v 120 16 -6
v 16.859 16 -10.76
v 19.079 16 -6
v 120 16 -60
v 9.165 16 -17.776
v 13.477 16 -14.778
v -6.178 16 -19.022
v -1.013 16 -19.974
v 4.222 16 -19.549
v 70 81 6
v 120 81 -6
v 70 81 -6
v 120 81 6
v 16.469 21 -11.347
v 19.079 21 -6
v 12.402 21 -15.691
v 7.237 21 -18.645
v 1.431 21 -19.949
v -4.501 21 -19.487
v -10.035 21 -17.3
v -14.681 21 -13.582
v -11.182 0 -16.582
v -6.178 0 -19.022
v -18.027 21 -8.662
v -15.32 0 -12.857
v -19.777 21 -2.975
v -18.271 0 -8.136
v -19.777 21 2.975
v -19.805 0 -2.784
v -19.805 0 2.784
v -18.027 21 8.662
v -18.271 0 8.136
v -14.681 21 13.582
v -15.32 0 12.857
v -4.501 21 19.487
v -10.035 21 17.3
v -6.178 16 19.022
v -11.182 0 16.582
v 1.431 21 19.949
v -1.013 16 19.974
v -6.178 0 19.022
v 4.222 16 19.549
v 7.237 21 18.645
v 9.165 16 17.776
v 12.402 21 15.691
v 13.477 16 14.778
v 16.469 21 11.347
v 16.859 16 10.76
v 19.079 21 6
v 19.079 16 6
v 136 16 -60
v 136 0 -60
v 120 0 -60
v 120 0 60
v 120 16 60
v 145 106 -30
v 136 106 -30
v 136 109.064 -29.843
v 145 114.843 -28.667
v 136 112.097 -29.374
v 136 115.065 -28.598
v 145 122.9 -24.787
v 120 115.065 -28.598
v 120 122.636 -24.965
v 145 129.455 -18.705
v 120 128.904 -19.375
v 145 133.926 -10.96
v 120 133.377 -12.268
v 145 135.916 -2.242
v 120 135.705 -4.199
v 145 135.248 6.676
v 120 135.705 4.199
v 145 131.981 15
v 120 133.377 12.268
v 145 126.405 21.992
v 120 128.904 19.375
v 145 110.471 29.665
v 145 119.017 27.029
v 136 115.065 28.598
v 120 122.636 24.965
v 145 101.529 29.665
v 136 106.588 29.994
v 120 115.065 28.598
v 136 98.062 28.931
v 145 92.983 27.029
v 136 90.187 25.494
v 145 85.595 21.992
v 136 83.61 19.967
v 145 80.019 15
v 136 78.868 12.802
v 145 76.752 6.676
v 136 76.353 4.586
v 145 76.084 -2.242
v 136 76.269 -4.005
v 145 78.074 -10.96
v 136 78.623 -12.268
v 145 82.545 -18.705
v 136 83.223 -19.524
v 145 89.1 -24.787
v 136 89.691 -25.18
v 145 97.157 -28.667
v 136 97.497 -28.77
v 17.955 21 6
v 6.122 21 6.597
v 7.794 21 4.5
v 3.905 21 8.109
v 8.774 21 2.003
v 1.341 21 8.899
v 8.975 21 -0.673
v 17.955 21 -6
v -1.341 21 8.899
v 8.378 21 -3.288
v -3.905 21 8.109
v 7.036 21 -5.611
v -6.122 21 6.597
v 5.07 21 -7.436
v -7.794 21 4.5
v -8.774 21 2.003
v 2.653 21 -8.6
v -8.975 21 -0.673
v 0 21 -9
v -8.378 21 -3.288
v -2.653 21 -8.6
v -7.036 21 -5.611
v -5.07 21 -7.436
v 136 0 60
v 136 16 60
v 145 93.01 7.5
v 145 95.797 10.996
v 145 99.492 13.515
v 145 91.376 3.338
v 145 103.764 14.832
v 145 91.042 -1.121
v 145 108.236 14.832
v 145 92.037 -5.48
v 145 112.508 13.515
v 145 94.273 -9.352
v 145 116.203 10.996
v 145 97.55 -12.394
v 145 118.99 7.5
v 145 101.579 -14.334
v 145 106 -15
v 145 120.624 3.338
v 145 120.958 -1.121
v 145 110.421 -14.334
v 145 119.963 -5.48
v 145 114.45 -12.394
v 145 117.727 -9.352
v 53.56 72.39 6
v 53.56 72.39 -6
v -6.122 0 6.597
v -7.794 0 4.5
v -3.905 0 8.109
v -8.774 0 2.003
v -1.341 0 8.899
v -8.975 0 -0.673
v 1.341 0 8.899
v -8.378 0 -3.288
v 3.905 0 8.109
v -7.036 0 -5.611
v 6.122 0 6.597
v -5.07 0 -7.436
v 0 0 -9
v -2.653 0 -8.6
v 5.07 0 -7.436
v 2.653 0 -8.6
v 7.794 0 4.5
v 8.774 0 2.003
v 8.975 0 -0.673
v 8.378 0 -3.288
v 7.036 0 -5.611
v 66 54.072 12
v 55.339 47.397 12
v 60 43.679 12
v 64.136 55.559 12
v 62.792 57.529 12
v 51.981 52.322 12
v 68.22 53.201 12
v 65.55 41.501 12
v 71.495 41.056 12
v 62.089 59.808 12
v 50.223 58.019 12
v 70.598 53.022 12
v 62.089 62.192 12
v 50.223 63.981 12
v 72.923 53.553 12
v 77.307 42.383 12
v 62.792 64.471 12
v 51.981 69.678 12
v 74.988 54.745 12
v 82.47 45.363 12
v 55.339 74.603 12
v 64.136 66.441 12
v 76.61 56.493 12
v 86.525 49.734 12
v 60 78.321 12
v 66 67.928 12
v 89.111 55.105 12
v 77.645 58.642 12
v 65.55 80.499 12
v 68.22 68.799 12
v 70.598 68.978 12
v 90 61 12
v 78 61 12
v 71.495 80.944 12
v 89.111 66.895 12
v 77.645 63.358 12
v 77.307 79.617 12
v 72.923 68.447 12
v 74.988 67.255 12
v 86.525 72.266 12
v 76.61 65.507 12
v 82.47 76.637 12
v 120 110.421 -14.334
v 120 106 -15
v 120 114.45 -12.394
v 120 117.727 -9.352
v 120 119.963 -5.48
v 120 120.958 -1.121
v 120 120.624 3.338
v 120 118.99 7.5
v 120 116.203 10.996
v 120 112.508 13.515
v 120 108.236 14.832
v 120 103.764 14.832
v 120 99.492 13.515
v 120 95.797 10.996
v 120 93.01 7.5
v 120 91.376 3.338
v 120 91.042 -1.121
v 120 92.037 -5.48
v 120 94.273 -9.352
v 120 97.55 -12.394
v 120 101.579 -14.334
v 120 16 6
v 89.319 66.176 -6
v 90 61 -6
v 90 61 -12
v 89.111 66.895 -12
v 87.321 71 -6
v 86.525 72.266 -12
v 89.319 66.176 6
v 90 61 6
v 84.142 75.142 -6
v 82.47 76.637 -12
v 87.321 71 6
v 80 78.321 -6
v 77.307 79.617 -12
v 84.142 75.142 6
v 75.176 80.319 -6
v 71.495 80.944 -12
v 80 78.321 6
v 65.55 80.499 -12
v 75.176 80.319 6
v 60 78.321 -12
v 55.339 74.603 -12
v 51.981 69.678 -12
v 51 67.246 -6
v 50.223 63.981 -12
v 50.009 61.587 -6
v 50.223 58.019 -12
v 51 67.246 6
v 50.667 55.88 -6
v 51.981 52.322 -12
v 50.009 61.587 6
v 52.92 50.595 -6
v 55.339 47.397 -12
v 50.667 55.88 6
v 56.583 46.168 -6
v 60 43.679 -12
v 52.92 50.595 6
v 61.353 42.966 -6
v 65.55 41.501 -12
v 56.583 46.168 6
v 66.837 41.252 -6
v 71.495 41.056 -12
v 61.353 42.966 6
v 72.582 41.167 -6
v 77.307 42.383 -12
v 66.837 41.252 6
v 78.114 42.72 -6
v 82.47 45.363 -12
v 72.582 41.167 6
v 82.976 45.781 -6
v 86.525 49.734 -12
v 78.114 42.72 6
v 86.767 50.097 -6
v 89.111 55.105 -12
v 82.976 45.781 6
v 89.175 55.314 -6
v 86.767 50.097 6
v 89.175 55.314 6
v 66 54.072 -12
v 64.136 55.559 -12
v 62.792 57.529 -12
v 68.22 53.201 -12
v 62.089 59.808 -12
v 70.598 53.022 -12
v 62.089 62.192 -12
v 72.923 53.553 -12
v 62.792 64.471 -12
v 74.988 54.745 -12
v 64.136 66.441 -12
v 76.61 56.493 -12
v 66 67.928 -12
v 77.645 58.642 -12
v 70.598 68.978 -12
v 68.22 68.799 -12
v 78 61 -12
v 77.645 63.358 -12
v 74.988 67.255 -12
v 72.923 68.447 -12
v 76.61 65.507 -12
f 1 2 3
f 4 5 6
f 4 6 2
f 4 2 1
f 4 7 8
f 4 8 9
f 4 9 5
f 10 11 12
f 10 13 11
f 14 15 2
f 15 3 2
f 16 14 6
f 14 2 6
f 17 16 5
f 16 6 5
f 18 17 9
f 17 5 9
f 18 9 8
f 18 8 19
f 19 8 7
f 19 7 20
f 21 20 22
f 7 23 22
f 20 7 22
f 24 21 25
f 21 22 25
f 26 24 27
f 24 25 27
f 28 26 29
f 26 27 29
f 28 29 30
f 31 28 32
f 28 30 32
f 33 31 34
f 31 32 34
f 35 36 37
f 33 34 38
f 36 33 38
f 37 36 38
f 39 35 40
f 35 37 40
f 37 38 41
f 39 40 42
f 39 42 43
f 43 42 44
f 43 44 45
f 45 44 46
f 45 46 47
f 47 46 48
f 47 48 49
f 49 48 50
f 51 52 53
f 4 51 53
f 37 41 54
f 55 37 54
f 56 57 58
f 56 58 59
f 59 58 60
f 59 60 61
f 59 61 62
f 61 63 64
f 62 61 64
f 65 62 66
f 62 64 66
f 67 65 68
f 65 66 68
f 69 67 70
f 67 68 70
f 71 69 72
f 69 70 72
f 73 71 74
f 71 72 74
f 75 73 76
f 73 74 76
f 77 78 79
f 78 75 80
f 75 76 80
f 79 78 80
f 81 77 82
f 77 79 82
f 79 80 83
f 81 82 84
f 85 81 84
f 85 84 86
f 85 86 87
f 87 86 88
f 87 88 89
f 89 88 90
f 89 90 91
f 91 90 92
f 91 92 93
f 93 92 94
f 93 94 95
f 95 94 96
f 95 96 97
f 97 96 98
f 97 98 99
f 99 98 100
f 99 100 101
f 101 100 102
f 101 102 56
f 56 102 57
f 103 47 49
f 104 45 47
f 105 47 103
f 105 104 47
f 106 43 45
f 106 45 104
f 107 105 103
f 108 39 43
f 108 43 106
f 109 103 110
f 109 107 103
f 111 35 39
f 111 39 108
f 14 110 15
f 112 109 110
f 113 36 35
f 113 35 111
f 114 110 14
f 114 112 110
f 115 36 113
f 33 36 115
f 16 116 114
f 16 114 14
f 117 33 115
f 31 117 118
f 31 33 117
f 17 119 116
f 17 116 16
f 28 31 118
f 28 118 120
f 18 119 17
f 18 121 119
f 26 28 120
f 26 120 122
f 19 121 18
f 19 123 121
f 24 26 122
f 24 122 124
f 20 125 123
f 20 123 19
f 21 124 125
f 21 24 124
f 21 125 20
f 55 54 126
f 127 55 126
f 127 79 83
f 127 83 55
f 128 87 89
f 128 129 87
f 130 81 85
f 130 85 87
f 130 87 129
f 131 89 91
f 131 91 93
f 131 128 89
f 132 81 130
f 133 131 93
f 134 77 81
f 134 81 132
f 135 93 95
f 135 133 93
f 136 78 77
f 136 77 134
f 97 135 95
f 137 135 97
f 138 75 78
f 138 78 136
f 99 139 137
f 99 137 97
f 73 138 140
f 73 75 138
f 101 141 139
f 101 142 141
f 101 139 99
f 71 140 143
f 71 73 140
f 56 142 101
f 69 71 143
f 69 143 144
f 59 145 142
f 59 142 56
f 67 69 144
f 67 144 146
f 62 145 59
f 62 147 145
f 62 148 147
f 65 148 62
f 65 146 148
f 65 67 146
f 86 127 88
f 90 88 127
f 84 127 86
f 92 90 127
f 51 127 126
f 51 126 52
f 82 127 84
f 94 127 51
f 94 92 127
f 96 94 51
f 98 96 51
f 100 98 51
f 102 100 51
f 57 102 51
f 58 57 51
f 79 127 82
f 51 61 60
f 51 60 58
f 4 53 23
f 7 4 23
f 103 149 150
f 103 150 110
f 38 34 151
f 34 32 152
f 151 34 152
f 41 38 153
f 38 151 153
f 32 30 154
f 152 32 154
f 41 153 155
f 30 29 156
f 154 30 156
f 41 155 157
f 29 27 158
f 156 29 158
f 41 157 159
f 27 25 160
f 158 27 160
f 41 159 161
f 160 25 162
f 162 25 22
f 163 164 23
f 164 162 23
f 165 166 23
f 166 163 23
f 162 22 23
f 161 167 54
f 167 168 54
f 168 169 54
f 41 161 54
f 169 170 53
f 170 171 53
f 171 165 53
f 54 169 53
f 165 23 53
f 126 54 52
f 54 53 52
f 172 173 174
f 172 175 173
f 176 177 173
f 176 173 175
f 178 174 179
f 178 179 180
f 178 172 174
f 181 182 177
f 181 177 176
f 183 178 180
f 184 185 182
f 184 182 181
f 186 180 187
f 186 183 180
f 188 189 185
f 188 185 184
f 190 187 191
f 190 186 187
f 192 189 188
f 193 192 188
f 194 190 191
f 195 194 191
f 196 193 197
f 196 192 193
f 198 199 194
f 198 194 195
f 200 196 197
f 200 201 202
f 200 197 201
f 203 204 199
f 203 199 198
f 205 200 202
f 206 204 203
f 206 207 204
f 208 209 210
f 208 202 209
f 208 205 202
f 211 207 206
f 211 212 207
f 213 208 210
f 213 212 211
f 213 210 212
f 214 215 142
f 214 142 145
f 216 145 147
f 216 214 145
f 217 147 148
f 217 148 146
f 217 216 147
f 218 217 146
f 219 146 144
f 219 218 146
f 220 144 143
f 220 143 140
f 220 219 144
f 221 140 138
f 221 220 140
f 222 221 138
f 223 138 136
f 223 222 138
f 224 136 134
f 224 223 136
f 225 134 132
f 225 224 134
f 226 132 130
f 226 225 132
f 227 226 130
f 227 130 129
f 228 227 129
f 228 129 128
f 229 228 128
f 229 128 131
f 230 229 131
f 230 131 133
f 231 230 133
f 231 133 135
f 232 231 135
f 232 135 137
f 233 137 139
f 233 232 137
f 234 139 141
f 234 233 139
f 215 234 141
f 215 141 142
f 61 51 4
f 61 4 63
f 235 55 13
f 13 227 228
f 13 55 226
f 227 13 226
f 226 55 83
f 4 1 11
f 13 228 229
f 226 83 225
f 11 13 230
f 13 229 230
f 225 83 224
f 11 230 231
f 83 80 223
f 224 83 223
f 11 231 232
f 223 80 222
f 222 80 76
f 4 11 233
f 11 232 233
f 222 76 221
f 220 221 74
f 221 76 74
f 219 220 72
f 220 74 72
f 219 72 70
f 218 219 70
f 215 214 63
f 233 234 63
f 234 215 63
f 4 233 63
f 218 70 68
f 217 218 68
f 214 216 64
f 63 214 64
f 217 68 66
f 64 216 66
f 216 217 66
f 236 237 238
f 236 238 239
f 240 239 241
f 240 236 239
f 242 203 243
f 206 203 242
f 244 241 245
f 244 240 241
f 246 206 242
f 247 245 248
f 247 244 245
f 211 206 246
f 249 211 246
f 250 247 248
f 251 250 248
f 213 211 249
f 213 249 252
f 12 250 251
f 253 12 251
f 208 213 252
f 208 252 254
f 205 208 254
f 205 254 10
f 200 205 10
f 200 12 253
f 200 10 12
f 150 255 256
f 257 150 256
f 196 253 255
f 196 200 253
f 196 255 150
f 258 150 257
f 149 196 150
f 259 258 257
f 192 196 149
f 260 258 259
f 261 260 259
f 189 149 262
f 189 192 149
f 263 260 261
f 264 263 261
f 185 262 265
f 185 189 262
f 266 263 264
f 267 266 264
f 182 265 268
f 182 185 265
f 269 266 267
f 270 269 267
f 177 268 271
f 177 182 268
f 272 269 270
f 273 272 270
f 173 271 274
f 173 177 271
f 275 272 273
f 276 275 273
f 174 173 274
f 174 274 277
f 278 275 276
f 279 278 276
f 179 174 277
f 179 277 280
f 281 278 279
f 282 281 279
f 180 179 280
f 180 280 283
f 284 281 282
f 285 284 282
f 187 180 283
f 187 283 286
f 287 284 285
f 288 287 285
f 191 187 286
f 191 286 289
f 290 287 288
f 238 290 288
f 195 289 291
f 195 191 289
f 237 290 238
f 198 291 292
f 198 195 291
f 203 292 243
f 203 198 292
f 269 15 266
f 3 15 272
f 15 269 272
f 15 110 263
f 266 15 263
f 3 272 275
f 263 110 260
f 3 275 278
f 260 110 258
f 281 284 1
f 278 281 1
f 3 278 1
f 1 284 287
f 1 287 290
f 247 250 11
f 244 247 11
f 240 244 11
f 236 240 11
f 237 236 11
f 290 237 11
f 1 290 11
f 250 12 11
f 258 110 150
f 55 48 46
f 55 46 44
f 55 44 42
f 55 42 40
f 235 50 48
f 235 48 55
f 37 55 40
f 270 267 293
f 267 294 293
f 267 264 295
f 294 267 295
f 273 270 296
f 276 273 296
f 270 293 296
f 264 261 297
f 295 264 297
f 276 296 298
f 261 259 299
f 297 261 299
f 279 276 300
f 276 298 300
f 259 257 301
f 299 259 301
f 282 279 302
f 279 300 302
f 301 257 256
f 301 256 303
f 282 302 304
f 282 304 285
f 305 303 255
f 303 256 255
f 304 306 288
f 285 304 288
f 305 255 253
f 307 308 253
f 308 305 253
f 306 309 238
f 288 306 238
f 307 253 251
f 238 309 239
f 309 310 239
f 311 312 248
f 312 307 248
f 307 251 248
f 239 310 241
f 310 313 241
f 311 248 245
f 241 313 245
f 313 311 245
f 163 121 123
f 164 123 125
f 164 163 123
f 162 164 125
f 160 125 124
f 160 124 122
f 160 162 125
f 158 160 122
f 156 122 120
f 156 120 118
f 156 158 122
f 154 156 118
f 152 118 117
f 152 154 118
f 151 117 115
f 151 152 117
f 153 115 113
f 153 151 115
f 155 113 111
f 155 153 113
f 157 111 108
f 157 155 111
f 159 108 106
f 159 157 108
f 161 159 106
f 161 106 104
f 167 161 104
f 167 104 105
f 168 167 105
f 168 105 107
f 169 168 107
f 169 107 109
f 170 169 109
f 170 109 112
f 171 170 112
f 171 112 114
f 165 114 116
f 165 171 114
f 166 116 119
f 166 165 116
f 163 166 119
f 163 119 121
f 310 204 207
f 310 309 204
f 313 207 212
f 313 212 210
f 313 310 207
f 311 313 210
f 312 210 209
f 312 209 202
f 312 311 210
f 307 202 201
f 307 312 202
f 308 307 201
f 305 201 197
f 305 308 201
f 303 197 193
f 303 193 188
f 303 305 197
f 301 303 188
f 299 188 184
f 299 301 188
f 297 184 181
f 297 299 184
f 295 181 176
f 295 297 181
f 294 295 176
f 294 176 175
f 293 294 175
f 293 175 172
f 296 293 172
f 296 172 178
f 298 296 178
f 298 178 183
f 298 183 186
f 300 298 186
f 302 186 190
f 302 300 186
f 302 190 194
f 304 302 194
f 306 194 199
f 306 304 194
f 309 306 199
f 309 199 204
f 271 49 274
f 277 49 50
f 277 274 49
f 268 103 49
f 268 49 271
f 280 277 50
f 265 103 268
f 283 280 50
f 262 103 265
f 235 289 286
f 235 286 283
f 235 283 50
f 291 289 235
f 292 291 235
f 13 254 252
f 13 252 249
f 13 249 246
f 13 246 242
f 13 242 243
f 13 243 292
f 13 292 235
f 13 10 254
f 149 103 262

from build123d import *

# Parameters (mm, degrees)
SKETCH1_R           = 9
BOSS_EXTRUDE3_DEPTH = 21
BOSS_EXTRUDE4_DEPTH = 16
BOSS_EXTRUDE5_START = -16
SKETCH2_R           = 15
BOSS_EXTRUDE5_DEPTH = 25
BOSS_EXTRUDE6_DEPTH = 16
SKETCH4_R           = 8
BOSS_EXTRUDE7_DEPTH = 12
BOSS_EXTRUDE9_DEPTH = 6


with BuildPart() as part:
    # Sketch1 → Boss-Extrude3 (new body)
    with BuildSketch(Plane(origin=(0, 0, 0), x_dir=(1, 0, 0), z_dir=(0, 1, 0))):
        with BuildLine():
            ThreePointArc((20, 0), (11.756842217, 16.179513623), (-6.177666108, 19.021998882))
            ThreePointArc((-6.177666108, 19.021998882), (-20, 0), (-6.177666108, -19.021998882))
            ThreePointArc((-6.177666108, -19.021998882), (11.756842217, -16.179513623), (20, 0))
        make_face()
        Circle(SKETCH1_R, mode=Mode.SUBTRACT)
    extrude(amount=BOSS_EXTRUDE3_DEPTH)

    # Sketch1<5> → Boss-Extrude4 (add)
    with BuildSketch(Plane(origin=(0, 0, 0), x_dir=(1, 0, 0), z_dir=(0, 1, 0))):
        with BuildLine():
            ThreePointArc((-6.177666108, 19.021998882), (20, 0), (-6.177666108, -19.021998882))
            Line((-6.177666108, -19.021998882), (120, -60))
            Line((120, -60), (136, -60))
            Line((136, -60), (136, 60))
            Line((136, 60), (120, 60))
            Line((120, 60), (-6.177666108, 19.021998882))
        make_face()
    extrude(amount=BOSS_EXTRUDE4_DEPTH)



with BuildPart() as body_2:
    # Sketch2 → Boss-Extrude5 (new body)
    with BuildSketch(Plane(origin=(136, 0, 0), x_dir=(0, 0, -1), z_dir=(1, 0, 0)).offset(BOSS_EXTRUDE5_START)):
        with BuildLine():
            ThreePointArc((-28.597626566, 115.065084378), (-4.586458493, 76.35266625), (30, 106))
            ThreePointArc((30, 106), (29.64733375, 110.586458493), (28.597626566, 115.065084378))
            ThreePointArc((28.597626566, 115.065084378), (0, 136), (-28.597626566, 115.065084378))
        make_face()
        with Locations((0, 106)):
            Circle(SKETCH2_R, mode=Mode.SUBTRACT)
    extrude(amount=BOSS_EXTRUDE5_DEPTH)


with BuildPart() as part_1:
    add(part.part)

    add(body_2.part)  # Boss-Extrude6 merges body 2
    # Sketch2<4> → Boss-Extrude6 (add)
    with BuildSketch(Plane(origin=(136, 0, 0), x_dir=(0, 0, -1), z_dir=(1, 0, 0))):
        with BuildLine():
            Line((-28.597626566, 115.065084378), (-60, 16))
            Line((-60, 16), (60, 16))
            Line((60, 16), (28.597626566, 115.065084378))
            ThreePointArc((28.597626566, 115.065084378), (29.64733375, 110.586458493), (30, 106))
            ThreePointArc((30, 106), (-4.586458493, 76.35266625), (-28.597626566, 115.065084378))
        make_face()
    extrude(amount=-BOSS_EXTRUDE6_DEPTH)



with BuildPart() as body_2_2:
    # Sketch4 → Boss-Extrude7 (new, symmetric)
    with BuildSketch(Plane.XY):
        with BuildLine():
            ThreePointArc((90, 61), (84.142135624, 75.142135624), (70, 81))
            ThreePointArc((70, 81), (60.721079538, 78.717269402), (53.560286641, 72.390163506))
            ThreePointArc((53.560286641, 72.390163506), (64.033186243, 41.910811081), (90, 61))
        make_face()
        with Locations((70, 61)):
            Circle(SKETCH4_R, mode=Mode.SUBTRACT)
    extrude(amount=BOSS_EXTRUDE7_DEPTH, both=True)


with BuildPart() as part_2:
    add(part_1.part)

    add(body_2_2.part)  # Boss-Extrude9 merges body 2 2
    # Sketch4<4> → Boss-Extrude9 (add, symmetric)
    with BuildSketch(Plane.XY):
        with BuildLine():
            Line((120, 81), (70, 81))
            ThreePointArc((70, 81), (84.142135624, 75.142135624), (90, 61))
            ThreePointArc((90, 61), (64.033186243, 41.910811081), (53.560286641, 72.390163506))
            Line((53.560286641, 72.390163506), (17.954899118, 21))
            Line((17.954899118, 21), (17.954899118, 16))
            Line((17.954899118, 16), (20, 16))
            Line((20, 16), (120, 16))
            Line((120, 16), (120, 81))
        make_face()
    extrude(amount=BOSS_EXTRUDE9_DEPTH, both=True)


solid = part_2.part
